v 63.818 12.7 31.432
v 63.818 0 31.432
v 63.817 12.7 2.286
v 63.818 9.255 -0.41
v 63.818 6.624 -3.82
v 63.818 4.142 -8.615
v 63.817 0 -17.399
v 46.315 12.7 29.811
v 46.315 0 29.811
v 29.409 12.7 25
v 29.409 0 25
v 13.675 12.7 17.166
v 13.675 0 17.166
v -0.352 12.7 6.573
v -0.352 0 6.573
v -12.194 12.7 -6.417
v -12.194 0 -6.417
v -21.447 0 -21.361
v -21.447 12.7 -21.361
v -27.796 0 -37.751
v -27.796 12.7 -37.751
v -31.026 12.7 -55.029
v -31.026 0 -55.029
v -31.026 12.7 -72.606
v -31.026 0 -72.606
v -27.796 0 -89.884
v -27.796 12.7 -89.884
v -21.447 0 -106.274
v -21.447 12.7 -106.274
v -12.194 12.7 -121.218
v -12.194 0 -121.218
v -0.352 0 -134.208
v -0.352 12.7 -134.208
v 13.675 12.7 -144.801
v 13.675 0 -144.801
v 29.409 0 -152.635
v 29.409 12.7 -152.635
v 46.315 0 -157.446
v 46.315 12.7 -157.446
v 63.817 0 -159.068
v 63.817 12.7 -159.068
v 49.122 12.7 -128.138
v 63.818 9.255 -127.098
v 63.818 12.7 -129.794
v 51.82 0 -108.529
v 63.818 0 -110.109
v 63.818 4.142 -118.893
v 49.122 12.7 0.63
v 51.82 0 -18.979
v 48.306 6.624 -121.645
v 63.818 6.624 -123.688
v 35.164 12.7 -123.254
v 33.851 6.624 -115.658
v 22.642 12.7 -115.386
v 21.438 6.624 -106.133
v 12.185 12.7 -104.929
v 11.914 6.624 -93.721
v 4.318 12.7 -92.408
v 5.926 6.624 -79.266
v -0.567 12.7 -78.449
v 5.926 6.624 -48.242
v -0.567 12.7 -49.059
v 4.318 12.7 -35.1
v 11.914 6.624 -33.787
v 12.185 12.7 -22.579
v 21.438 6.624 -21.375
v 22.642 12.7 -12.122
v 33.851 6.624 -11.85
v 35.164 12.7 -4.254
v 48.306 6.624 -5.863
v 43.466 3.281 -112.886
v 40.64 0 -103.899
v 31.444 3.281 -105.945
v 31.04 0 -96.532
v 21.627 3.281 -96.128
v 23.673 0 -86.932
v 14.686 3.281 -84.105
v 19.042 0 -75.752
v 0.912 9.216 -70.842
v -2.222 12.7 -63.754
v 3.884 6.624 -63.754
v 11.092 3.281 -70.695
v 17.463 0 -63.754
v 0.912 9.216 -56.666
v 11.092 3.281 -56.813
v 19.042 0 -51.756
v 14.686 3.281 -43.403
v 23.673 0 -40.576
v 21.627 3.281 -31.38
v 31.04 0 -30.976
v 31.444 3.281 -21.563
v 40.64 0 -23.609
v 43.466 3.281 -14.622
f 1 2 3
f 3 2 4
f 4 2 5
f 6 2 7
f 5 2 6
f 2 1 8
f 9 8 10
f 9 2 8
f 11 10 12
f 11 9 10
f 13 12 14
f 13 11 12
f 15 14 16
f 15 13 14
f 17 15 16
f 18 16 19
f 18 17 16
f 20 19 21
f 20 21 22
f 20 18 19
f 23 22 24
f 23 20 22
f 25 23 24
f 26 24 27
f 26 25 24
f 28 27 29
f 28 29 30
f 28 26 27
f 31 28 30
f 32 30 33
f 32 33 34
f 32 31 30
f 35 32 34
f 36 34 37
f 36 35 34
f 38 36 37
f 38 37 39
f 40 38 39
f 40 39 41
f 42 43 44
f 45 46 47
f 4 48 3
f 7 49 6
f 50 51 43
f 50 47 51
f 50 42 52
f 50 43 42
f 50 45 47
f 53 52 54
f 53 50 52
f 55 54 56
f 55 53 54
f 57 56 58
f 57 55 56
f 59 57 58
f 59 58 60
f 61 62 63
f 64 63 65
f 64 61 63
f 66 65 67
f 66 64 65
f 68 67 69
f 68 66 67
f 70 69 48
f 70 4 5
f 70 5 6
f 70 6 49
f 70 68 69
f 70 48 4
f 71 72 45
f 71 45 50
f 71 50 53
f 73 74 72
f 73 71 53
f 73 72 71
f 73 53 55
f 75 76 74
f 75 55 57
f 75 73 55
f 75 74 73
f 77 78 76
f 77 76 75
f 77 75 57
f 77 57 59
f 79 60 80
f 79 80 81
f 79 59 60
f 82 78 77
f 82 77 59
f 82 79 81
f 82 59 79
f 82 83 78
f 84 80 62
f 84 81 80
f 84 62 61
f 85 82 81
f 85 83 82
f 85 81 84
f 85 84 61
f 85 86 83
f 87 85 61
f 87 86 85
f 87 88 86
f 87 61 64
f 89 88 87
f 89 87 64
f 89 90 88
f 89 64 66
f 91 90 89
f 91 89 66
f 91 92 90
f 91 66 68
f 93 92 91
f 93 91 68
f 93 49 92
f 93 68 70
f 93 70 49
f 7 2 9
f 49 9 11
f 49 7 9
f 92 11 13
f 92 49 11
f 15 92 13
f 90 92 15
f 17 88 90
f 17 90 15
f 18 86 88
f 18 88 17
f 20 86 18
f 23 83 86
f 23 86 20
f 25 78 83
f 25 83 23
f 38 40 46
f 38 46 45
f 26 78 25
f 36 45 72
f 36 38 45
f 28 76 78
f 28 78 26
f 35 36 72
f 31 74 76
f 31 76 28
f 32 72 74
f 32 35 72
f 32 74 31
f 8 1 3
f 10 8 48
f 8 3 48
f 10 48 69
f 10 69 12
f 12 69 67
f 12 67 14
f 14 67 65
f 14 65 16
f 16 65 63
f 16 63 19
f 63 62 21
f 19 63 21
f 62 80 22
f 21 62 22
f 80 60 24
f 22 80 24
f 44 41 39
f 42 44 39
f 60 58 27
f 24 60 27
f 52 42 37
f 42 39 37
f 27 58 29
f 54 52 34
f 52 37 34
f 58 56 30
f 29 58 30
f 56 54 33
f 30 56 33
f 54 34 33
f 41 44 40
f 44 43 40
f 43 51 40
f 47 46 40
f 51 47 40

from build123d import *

# Parameters (mm, degrees)
SKETCH1_W           = 127.635
SKETCH1_H           = 127.635
BOSS_EXTRUDE1_DEPTH = 12.7
SKETCH12_R          = 95.4151
BOSS_EXTRUDE2_DEPTH = 12.7
SKETCH5_R           = 46.355
CUT_EXTRUDE1_DEPTH  = 9.525
SKETCH30_R          = 85.09
SKETCH30_R_2        = 79.375
BOSS_EXTRUDE3_DEPTH = 12.7
SKETCH32_R          = 1.35255
CUT_EXTRUDE4_DEPTH  = 15.24
CIRPATTERN2_COUNT   = 12
SKETCH36_R          = 115.31206939
SKETCH36_R_2        = 76.2
CUT_EXTRUDE5_DEPTH  = 35.9250001
SKETCH38_R          = 95.25
SKETCH38_R_2        = 76.2
BOSS_EXTRUDE4_DEPTH = 12.7
SKETCH37_W          = 208.61583397
SKETCH37_H          = 123.882270127
CUT_EXTRUDE6_DEPTH  = 96.25


with BuildPart() as part:
    # Sketch1 → Boss-Extrude1 (new body)
    with BuildSketch(Plane(origin=(0, 0, 0), x_dir=(1, 0, 0), z_dir=(0, 1, 0))):
        with Locations((63.8175, 63.8175)):
            Rectangle(SKETCH1_W, SKETCH1_H)
    extrude(amount=BOSS_EXTRUDE1_DEPTH)

    # Sketch12 → Boss-Extrude2 (add)
    with BuildSketch(Plane.XZ):
        with Locations((63.8175, -63.8175)):
            Circle(SKETCH12_R)
    extrude(amount=-BOSS_EXTRUDE2_DEPTH)

    # Sketch5 → Cut-Extrude1 (cut)
    with BuildSketch(Plane(origin=(0, 12.7, 0), x_dir=(1, 0, 0), z_dir=(0, 1, 0))):
        with Locations((63.8175, 63.8175)):
            Circle(SKETCH5_R)
    extrude(amount=-CUT_EXTRUDE1_DEPTH, mode=Mode.SUBTRACT)

    # Sketch30 → Boss-Extrude3 (add)
    with BuildSketch(Plane.XZ):
        with Locations((63.8175, -63.8175)):
            Circle(SKETCH30_R)
        with Locations((63.8175, -63.8175)):
            Circle(SKETCH30_R_2, mode=Mode.SUBTRACT)
    boss_extrude3 = extrude(amount=BOSS_EXTRUDE3_DEPTH)

    # Mirror1: Boss-Extrude3 across plane
    add(boss_extrude3.mirror(Plane.ZX.offset(4.7625)))

    # Sketch32 → Cut-Extrude4 (cut)
    with BuildSketch(Plane(origin=(0, 0, -148.9075), x_dir=(-1, 0, 0), z_dir=(0, 0, -1))):
        with Locations((-63.8175, -6.35)):
            Circle(SKETCH32_R)
        with Locations((-63.8175, 19.05)):
            Circle(SKETCH32_R)
    cut_extrude4 = extrude(amount=-CUT_EXTRUDE4_DEPTH, mode=Mode.SUBTRACT)

    # CirPattern2: Cut-Extrude4 ×12 about axis
    cirpattern2_axis = Axis((63.8175, -12.7, -63.8175), (0, 1, 0))
    for i in range(1, CIRPATTERN2_COUNT):
        add(cut_extrude4.rotate(cirpattern2_axis, i * 360 / CIRPATTERN2_COUNT), mode=Mode.SUBTRACT)

    # Sketch35 → Cut-Revolve1 (revolve, cut)
    with BuildSketch(Plane.XY.offset(-63.754)):
        with BuildLine():
            add(Edge.make_bspline(
                [(129.8575, 12.7), (125.556720128, 5.300210603), (116.945262531, 3.999403305), (110.1725, 0)],
                knots=[0, 0, 0, 0, 1, 1, 1, 1], degree=3))
            Line((110.1725, 0), (63.8175, 0))
            Line((63.8175, 0), (63.8175, 12.7))
            Line((63.8175, 12.7), (129.8575, 12.7))
        make_face()
    revolve(axis=Axis((63.8175, -10.330163638, -63.754), (0, 1, 0)), mode=Mode.SUBTRACT)

    # Sketch36 → Cut-Extrude5 (cut, through all)
    with BuildSketch(Plane(origin=(0, 22.225, 0), x_dir=(1, 0, 0), z_dir=(0, 1, 0))):
        with Locations((63.8175, 63.8175)):
            Circle(SKETCH36_R)
        with Locations((63.8175, 63.8175)):
            Circle(SKETCH36_R_2, mode=Mode.SUBTRACT)
    extrude(amount=-CUT_EXTRUDE5_DEPTH, mode=Mode.SUBTRACT)

    # Sketch38 → Boss-Extrude4 (add)
    with BuildSketch(Plane(origin=(0, 0, 0), x_dir=(-1, 0, 0), z_dir=(0, -1, 0))):
        with Locations((-63.8175, 63.8175)):
            Circle(SKETCH38_R)
        with Locations((-63.8175, 63.8175)):
            Circle(SKETCH38_R_2, mode=Mode.SUBTRACT)
    extrude(amount=-BOSS_EXTRUDE4_DEPTH)

    # Sketch37 → Cut-Extrude6 (cut, through all)
    with BuildSketch(Plane(origin=(63.8175, 0, 0), x_dir=(0, 0, -1), z_dir=(-1, 0, 0))):
        with Locations((61.023743595, -14.657491218)):
            Rectangle(SKETCH37_W, SKETCH37_H)
    extrude(amount=-CUT_EXTRUDE6_DEPTH, mode=Mode.SUBTRACT)


solid = part.part
